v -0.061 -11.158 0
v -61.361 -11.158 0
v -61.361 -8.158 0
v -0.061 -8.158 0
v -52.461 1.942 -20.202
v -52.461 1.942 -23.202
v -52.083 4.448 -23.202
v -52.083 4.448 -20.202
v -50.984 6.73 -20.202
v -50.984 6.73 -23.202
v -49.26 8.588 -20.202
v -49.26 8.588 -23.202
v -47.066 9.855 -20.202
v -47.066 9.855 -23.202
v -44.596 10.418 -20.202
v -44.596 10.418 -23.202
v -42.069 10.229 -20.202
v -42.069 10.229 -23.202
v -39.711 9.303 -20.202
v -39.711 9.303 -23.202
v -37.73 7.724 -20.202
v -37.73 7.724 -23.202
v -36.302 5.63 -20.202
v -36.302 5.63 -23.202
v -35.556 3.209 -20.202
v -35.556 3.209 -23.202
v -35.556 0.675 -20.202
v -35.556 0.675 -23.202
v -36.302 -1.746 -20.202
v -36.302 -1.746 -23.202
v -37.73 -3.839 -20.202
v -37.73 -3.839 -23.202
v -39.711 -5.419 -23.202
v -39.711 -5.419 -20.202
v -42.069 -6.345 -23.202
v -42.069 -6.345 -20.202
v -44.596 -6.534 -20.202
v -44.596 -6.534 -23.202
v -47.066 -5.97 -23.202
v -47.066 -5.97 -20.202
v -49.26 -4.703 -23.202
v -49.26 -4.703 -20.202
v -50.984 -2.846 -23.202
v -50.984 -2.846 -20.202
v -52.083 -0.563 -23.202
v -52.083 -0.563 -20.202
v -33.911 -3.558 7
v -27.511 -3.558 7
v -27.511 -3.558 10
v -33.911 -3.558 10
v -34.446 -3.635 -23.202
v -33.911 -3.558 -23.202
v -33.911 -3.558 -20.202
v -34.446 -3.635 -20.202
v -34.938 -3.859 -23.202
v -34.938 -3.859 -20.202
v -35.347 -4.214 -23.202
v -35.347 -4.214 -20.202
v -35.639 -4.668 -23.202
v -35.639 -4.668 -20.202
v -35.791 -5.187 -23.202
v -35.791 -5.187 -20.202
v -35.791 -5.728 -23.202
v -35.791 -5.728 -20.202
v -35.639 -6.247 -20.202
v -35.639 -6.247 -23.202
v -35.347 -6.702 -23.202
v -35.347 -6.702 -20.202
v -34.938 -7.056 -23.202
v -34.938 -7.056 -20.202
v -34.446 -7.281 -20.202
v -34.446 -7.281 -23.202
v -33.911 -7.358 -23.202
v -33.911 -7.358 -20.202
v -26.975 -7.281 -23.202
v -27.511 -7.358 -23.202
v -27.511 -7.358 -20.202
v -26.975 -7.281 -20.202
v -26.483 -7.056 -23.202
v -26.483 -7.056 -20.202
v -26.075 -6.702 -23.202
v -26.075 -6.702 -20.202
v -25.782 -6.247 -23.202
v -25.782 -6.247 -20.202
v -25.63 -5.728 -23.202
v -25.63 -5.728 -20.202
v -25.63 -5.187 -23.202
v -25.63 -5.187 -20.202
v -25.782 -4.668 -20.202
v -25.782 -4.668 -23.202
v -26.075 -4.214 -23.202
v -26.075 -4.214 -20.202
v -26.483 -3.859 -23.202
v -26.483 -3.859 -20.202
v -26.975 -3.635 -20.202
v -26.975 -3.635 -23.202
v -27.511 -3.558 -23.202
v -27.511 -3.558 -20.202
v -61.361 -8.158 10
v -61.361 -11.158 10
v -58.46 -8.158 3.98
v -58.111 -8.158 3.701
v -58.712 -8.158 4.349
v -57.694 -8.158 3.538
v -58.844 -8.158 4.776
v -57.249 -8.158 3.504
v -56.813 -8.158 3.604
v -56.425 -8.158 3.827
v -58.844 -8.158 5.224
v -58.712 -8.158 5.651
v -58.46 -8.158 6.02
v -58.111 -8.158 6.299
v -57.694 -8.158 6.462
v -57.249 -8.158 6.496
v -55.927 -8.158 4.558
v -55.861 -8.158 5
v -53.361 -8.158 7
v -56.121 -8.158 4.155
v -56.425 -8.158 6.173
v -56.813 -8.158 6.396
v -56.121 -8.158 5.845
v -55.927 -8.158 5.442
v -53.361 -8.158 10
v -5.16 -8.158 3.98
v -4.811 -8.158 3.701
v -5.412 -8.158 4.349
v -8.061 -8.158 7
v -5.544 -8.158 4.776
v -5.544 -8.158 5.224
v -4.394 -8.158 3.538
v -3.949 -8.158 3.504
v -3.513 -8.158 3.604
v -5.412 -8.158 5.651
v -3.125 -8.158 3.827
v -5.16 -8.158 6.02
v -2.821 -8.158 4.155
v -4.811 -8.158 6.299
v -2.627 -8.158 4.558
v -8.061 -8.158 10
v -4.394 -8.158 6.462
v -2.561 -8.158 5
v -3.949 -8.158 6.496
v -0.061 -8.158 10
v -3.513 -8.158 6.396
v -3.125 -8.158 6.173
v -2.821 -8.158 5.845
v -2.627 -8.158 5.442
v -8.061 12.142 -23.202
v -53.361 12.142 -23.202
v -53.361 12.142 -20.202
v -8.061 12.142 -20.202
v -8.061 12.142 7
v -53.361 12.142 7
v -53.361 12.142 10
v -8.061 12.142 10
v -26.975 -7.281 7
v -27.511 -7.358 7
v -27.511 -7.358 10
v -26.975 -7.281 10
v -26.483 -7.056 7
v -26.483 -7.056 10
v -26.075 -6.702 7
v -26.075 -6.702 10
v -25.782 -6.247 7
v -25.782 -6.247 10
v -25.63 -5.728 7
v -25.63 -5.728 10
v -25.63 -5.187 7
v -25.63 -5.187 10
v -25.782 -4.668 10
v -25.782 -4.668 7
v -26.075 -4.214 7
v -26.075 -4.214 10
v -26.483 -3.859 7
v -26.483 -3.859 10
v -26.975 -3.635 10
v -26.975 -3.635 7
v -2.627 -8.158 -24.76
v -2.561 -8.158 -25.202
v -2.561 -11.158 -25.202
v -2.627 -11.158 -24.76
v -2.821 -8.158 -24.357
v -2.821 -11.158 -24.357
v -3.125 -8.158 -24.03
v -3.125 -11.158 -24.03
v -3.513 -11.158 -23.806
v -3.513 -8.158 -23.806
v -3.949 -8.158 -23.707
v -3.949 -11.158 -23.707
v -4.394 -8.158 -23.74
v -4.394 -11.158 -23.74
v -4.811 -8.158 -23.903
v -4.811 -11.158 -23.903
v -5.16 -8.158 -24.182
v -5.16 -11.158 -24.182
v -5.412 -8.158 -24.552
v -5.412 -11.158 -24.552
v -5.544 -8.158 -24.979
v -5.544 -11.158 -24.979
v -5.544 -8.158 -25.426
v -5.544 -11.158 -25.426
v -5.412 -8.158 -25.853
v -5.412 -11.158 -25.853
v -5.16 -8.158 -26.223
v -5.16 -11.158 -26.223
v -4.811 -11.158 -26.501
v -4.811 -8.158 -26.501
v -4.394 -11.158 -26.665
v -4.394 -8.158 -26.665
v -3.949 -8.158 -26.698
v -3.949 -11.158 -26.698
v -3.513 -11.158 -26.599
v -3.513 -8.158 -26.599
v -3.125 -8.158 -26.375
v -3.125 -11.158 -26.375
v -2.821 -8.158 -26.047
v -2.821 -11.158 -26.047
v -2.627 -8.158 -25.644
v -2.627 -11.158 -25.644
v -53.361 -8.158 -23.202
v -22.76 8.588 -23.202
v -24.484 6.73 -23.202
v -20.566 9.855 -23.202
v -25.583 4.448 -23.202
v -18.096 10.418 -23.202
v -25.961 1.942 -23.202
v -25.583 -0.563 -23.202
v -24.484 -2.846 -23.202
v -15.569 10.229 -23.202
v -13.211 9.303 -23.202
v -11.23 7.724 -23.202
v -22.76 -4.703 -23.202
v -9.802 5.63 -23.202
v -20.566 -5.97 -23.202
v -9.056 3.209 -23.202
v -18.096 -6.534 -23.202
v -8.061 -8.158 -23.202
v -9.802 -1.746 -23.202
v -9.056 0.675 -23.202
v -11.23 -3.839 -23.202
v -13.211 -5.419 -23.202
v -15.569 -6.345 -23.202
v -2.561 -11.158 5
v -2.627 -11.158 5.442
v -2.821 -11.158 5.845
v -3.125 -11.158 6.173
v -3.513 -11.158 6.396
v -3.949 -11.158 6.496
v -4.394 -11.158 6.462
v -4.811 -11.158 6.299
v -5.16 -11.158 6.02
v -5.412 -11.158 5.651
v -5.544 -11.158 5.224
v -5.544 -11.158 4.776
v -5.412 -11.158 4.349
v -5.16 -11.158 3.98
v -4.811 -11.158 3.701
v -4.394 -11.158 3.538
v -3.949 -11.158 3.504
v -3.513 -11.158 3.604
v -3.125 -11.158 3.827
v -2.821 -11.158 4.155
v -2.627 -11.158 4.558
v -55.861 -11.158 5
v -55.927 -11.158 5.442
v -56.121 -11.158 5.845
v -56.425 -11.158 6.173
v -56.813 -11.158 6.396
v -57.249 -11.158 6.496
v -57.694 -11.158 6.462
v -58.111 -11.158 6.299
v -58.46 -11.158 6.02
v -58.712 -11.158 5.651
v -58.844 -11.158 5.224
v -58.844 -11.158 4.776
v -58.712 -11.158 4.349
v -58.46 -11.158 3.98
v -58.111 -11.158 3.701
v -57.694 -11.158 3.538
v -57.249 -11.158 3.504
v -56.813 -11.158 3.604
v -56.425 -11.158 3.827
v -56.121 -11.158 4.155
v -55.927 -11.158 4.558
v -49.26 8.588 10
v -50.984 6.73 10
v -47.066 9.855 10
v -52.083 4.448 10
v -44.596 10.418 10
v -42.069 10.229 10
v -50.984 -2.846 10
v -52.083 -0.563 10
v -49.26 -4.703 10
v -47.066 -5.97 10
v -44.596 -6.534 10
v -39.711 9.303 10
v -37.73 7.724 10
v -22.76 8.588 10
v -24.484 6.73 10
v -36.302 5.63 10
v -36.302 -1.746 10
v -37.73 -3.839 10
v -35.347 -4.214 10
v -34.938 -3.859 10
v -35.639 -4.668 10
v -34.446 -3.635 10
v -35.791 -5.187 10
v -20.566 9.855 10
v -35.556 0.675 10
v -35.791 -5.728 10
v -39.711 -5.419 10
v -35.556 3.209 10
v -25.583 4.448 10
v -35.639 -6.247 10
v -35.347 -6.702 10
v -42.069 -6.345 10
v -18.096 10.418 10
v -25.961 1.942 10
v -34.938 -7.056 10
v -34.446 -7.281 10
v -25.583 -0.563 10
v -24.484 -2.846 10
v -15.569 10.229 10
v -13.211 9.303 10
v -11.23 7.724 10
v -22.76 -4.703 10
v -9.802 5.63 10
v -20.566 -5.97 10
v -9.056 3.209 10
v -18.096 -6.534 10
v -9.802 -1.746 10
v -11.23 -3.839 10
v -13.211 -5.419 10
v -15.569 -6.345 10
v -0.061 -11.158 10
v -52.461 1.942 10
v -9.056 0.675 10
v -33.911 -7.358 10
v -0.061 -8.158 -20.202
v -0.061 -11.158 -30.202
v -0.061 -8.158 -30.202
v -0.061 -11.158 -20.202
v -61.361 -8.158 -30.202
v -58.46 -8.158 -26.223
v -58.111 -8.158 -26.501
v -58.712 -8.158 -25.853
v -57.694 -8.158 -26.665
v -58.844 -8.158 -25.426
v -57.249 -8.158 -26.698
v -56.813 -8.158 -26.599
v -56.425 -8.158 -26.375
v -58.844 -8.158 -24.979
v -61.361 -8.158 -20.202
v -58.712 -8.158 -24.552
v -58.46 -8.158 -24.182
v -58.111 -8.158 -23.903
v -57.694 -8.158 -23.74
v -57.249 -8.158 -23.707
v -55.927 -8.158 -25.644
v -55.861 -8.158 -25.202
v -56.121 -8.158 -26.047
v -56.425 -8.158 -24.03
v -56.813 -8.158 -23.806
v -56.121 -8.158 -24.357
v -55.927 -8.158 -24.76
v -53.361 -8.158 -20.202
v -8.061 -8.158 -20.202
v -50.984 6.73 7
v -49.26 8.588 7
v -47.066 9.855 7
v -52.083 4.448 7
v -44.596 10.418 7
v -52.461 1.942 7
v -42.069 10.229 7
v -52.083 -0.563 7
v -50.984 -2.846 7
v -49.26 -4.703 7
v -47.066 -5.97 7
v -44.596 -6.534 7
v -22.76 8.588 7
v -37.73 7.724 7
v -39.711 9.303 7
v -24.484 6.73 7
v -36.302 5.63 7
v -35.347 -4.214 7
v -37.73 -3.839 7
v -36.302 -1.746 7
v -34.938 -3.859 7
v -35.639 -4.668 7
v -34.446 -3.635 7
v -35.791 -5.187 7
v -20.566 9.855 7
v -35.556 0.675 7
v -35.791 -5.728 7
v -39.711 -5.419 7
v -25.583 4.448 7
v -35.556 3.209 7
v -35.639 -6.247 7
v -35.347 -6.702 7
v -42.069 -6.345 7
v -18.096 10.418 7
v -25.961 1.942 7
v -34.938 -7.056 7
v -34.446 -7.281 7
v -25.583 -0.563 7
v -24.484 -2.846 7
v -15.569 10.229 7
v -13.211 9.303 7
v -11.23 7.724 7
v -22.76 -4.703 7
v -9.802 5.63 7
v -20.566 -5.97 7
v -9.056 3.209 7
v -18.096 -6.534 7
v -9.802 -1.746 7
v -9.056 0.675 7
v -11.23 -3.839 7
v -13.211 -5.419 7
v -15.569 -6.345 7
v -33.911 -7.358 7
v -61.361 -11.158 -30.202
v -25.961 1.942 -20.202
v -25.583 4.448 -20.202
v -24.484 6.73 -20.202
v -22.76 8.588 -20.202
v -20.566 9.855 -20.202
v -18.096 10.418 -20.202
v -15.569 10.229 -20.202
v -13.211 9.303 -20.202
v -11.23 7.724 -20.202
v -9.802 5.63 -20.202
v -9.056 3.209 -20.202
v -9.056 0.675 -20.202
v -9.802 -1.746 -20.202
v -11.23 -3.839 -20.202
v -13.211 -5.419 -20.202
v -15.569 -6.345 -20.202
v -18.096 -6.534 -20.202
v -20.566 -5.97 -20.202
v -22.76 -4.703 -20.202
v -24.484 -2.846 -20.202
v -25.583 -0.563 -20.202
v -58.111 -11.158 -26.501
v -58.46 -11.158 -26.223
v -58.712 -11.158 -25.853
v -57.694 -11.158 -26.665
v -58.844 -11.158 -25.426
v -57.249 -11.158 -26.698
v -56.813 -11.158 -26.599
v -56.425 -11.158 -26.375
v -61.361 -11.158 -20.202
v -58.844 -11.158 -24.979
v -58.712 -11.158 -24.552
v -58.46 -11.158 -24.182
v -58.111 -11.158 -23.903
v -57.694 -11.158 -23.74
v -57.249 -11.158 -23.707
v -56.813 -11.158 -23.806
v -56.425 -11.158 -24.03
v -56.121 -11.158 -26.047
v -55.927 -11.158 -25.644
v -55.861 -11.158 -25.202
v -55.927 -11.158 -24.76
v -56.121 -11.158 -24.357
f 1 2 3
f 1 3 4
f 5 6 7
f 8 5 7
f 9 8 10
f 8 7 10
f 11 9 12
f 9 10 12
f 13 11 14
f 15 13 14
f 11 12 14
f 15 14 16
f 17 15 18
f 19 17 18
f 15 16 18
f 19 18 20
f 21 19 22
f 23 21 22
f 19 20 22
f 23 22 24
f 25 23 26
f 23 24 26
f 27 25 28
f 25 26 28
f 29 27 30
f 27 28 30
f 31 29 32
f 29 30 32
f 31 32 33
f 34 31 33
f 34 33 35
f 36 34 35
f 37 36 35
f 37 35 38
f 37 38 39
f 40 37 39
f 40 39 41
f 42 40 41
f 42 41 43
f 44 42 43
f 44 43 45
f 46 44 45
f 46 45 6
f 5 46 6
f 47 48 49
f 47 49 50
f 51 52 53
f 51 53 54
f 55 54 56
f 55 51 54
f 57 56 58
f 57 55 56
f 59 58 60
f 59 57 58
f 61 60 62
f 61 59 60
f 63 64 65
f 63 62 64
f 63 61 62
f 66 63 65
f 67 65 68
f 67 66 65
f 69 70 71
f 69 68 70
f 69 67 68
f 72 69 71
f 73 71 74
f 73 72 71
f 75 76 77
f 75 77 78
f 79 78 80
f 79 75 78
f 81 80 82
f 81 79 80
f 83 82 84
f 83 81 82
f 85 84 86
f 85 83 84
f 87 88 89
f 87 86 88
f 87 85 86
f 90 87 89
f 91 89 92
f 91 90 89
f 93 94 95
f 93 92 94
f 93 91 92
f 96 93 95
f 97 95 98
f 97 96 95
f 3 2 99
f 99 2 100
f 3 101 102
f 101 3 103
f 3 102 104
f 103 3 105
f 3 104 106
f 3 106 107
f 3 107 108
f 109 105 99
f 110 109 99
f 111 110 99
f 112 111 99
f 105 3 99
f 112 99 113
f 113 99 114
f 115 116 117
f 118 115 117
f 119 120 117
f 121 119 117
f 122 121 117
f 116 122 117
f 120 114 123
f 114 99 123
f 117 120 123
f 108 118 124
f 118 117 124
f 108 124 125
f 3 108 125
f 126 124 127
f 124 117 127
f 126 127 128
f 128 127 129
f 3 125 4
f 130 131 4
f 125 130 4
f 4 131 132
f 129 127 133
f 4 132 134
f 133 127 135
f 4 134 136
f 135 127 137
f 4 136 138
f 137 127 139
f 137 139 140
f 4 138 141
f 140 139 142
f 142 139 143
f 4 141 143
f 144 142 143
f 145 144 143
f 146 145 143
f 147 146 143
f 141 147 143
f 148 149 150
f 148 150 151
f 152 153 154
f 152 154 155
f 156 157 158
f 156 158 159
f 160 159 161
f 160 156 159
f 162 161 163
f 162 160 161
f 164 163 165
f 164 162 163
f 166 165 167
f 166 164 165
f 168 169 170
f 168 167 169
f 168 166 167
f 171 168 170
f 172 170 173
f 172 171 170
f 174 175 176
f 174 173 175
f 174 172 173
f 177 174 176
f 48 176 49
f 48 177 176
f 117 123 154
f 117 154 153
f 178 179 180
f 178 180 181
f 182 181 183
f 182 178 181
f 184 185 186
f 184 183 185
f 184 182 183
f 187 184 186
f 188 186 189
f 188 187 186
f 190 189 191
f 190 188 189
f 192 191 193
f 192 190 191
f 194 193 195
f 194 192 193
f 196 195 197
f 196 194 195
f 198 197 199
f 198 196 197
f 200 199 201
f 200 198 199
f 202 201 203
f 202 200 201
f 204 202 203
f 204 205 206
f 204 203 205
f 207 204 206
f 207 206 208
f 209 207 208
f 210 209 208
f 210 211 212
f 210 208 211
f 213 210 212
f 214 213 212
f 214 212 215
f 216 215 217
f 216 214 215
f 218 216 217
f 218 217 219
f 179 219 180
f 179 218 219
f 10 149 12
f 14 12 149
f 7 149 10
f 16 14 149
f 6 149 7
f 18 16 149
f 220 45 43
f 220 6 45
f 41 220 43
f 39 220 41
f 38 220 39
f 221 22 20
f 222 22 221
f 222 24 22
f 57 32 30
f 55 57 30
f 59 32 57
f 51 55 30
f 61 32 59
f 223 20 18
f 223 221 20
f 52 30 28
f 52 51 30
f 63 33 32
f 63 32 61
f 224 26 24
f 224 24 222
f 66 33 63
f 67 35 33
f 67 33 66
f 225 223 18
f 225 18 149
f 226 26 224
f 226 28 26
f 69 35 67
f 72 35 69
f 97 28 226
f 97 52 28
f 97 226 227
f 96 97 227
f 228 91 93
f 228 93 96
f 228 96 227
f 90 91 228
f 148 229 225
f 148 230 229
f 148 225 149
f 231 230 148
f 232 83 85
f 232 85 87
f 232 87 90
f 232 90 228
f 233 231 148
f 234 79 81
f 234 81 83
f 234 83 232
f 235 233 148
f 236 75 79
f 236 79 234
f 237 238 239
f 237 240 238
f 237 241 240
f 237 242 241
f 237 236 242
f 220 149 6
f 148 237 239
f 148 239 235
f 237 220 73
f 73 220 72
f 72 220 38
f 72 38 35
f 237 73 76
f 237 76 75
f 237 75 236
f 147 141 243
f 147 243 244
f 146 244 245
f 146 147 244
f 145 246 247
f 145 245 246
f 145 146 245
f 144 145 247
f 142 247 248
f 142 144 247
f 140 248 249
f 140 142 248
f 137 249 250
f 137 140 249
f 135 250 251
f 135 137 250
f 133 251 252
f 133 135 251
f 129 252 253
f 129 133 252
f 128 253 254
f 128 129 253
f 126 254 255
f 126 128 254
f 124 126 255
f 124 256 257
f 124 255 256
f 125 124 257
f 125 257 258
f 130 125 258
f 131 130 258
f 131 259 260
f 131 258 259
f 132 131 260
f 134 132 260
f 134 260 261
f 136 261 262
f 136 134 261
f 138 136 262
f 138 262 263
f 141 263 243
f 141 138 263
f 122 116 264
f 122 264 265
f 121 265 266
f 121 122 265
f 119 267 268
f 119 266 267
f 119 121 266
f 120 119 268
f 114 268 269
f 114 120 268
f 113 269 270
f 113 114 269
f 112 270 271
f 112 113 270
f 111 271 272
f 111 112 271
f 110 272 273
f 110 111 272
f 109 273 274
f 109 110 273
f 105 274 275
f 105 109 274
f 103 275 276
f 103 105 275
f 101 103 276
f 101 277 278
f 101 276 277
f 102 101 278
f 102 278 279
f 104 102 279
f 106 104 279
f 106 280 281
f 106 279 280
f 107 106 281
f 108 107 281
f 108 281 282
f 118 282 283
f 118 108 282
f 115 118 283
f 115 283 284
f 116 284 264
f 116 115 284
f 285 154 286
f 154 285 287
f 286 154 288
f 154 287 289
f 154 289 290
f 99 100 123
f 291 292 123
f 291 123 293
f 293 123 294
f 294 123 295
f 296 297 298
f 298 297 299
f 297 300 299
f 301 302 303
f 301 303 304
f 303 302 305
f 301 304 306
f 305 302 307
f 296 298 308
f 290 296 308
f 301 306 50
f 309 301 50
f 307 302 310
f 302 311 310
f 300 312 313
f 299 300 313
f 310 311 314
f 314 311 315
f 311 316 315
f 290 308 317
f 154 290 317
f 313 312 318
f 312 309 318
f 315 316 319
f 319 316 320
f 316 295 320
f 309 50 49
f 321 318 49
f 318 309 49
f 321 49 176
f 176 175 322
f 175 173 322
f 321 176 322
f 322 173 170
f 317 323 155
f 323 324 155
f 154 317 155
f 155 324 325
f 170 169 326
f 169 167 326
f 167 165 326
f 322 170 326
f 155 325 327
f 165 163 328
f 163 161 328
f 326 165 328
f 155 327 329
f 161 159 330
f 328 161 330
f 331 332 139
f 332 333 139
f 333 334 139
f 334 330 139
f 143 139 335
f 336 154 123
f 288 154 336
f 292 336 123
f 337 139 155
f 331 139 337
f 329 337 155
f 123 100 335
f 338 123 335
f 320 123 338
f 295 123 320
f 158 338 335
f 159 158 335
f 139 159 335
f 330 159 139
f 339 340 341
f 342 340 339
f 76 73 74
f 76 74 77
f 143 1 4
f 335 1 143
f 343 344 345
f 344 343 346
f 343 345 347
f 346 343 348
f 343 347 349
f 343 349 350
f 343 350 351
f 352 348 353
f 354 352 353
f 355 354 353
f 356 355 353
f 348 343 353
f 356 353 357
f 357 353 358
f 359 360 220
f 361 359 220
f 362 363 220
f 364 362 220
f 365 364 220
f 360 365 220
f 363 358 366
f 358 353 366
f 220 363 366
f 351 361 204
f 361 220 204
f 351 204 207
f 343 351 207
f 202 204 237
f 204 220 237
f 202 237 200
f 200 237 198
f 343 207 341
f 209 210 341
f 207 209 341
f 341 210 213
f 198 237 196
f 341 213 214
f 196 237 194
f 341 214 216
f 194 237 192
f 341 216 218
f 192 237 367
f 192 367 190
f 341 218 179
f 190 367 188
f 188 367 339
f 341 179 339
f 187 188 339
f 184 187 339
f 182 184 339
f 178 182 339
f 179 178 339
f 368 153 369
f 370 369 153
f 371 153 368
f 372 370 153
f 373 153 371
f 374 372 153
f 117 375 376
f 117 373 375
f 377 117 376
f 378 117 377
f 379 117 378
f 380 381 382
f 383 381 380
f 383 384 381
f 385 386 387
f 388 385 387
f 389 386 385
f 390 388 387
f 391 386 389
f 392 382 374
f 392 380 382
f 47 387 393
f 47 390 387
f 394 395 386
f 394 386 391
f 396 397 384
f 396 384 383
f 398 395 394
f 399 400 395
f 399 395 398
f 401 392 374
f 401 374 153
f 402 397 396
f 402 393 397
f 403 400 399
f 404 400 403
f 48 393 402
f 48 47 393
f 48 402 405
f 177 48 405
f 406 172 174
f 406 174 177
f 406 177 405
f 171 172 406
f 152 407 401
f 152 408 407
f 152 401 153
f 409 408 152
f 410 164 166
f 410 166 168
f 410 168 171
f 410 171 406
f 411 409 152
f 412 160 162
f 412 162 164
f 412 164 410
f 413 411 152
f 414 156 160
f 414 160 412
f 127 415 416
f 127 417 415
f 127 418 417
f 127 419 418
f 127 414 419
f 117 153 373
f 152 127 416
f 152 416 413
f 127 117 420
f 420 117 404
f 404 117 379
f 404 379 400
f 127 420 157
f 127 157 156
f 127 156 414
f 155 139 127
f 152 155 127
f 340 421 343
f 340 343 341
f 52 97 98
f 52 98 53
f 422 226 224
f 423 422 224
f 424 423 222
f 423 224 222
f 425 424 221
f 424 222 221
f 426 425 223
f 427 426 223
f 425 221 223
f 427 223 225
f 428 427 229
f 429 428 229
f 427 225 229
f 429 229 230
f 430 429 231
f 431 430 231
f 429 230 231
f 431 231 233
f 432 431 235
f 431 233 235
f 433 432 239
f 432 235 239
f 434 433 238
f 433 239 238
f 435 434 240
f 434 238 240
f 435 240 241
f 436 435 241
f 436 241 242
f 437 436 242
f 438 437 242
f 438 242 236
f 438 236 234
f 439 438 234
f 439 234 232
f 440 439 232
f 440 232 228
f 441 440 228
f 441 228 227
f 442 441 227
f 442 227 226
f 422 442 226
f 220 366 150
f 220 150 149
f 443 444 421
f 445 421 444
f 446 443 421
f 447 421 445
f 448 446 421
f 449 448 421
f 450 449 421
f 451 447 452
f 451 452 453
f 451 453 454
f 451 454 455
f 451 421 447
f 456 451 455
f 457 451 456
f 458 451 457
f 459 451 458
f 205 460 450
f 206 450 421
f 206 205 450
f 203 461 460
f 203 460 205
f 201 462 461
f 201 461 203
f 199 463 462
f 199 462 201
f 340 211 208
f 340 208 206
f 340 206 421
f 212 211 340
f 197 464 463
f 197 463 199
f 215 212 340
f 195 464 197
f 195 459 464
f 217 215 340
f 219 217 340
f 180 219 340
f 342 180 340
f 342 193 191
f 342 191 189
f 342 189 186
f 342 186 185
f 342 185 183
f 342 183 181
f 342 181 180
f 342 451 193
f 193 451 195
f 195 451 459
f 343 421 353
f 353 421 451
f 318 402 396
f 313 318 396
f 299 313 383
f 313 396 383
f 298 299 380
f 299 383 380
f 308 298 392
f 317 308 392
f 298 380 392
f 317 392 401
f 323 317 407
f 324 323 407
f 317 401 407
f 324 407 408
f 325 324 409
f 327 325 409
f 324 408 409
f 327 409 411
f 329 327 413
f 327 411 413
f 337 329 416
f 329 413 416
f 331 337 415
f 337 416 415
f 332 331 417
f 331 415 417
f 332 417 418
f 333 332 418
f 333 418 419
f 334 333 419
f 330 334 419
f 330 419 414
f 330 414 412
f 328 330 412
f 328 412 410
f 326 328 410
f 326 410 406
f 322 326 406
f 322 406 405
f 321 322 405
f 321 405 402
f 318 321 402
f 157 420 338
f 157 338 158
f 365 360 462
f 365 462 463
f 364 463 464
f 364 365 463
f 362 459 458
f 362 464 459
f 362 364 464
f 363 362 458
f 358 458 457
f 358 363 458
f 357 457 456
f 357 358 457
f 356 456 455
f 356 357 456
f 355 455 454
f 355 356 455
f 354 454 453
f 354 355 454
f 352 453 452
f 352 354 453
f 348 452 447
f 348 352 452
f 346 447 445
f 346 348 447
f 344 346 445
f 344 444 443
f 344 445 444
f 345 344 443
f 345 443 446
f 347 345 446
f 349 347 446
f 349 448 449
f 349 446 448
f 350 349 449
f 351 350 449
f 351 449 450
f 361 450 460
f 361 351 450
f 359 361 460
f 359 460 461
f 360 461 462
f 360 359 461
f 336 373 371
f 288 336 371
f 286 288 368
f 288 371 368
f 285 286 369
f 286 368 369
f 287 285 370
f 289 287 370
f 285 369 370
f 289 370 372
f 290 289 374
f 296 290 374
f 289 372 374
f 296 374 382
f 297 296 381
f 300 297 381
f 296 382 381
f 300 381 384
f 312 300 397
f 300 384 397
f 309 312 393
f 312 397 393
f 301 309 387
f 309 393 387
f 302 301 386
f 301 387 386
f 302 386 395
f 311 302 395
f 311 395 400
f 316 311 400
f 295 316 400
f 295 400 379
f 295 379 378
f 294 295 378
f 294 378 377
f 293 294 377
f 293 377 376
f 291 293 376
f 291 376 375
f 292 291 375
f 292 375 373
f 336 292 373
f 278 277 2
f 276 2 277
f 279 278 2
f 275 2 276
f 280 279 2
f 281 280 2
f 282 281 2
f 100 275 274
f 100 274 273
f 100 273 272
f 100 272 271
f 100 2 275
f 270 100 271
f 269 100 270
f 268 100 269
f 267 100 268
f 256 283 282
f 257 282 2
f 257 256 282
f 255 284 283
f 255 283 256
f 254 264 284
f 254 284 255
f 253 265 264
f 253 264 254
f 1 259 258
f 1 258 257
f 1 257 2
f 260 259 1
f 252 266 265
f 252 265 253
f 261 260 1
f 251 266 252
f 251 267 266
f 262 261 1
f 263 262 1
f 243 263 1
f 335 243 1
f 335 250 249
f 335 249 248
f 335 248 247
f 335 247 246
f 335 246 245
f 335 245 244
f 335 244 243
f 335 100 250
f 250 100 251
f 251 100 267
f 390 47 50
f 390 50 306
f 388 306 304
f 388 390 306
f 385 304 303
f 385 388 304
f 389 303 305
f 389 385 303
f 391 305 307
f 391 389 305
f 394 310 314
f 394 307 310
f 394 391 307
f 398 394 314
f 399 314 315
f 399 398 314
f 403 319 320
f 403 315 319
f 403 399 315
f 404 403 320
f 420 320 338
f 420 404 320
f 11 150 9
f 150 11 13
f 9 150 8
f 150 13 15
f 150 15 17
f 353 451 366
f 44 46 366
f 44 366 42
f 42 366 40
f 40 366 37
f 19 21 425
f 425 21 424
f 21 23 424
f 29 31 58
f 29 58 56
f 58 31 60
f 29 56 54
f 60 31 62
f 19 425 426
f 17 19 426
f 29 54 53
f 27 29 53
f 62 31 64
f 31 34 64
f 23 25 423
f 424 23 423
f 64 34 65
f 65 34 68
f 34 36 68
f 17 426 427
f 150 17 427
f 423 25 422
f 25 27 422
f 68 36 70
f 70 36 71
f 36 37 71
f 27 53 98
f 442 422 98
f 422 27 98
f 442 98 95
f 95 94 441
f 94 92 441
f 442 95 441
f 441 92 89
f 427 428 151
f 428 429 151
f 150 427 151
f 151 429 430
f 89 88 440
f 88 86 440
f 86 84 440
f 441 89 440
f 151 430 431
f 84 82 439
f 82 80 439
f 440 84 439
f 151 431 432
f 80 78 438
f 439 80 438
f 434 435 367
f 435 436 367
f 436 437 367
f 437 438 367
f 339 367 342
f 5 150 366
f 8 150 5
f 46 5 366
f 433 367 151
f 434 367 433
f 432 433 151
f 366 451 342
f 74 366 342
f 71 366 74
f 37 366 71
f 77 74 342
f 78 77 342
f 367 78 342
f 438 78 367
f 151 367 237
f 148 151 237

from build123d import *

# Parameters (mm, degrees)
SKETCH1_W               = 170
SKETCH1_H               = 3
BOSS_EXTRUDE1_DEPTH     = 10
SKETCH4_R               = 1.2
CUT_EXTRUDE1_DEPTH      = 21
SKETCH2_W               = 45.3
SKETCH2_H               = 3
BOSS_EXTRUDE6_DEPTH     = 20.3
SKETCH5_R               = 8.5
CUT_EXTRUDE2_DEPTH      = 20.3
SKETCH6_W               = 45.3
SKETCH6_H               = 3
BOSS_EXTRUDE7_DEPTH     = 20.3
SKETCH7_R               = 8.5
CUT_EXTRUDE3_DEPTH      = 100.885733504
CUT_EXTRUDE5_DEPTH      = 102.201856693
CUT_EXTRUDE5_DEPTH_BACK = 102.201856693
SKETCH12_W              = 88.7
SKETCH12_H              = 17.241657791
CUT_EXTRUDE6_DEPTH      = 75.862735481
CUT_EXTRUDE6_DEPTH_BACK = 75.862735481
SKETCH13_W              = 37.135878318
SKETCH13_H              = 38.462159687
SKETCH13_W_2            = 38.462159687
SKETCH13_H_2            = 47.746129266
SKETCH15_W              = 8
SKETCH15_H              = 10
BOSS_EXTRUDE9_DEPTH     = 3
CUT_EXTRUDE7_DEPTH      = 67.392895801
CUT_EXTRUDE7_DEPTH_BACK = 67.392895801
SKETCH16_R              = 1.5


with BuildPart() as part:
    # Sketch1 → Boss-Extrude1 (new body)
    with BuildSketch(Plane.XY):
        with Locations((13.639372454, -9.657761352)):
            Rectangle(SKETCH1_W, SKETCH1_H)
    extrude(amount=BOSS_EXTRUDE1_DEPTH)

    # Sketch4 → Cut-Extrude1 (cut)
    with BuildSketch(Plane(origin=(0, -8.157761352, 0), x_dir=(1, 0, 0), z_dir=(0, 1, 0))):
        with Locations(Location((-63.360627546, -4.938536908, 0), (0, 0, 180))):
            Circle(SKETCH4_R)
        with Locations(Location((90.639372454, -5.283238547, 0), (0, 0, 180))):
            Circle(SKETCH4_R)
    extrude(amount=-CUT_EXTRUDE1_DEPTH, mode=Mode.SUBTRACT)

    # Sketch2 → Boss-Extrude6 (add)
    with BuildSketch(Plane(origin=(0, -8.157761352, 0), x_dir=(1, 0, 0), z_dir=(0, 1, 0))):
        with Locations((-30.710627546, -8.5)):
            Rectangle(SKETCH2_W, SKETCH2_H)
    extrude(amount=BOSS_EXTRUDE6_DEPTH)

    # Sketch5 → Cut-Extrude2 (cut)
    with BuildSketch(Plane(origin=(0, 0, 7), x_dir=(-1, 0, 0), z_dir=(0, 0, -1))):
        with Locations((17.460627546, 1.942238648)):
            Circle(SKETCH5_R)
        with Locations((43.960627546, 1.942238648)):
            Circle(SKETCH5_R)
        with BuildLine():
            Line((27.510627546, -3.557761352), (33.910627546, -3.557761352))
            ThreePointArc((33.910627546, -3.557761352), (35.810627546, -5.457761352), (33.910627546, -7.357761352))
            Line((33.910627546, -7.357761352), (27.510627546, -7.357761352))
            ThreePointArc((27.510627546, -7.357761352), (25.610627546, -5.457761352), (27.510627546, -3.557761352))
        make_face()
    extrude(amount=-CUT_EXTRUDE2_DEPTH, mode=Mode.SUBTRACT)

    # Sketch6 → Boss-Extrude7 (add)
    with BuildSketch(Plane(origin=(0, -8.157761352, 0), x_dir=(1, 0, 0), z_dir=(0, 1, 0))):
        with Locations((57.989372454, -8.5)):
            Rectangle(SKETCH6_W, SKETCH6_H)
    extrude(amount=BOSS_EXTRUDE7_DEPTH)

    # Sketch7 → Cut-Extrude3 (cut, through all)
    with BuildSketch(Plane.XY.offset(10)):
        with Locations((44.739372454, 1.942238648)):
            Circle(SKETCH7_R)
        with Locations((71.239372454, 1.942238648)):
            Circle(SKETCH7_R)
        with BuildLine():
            Line((54.839372454, -3.557761352), (61.239372454, -3.557761352))
            ThreePointArc((61.239372454, -3.557761352), (63.139372454, -5.457761352), (61.239372454, -7.357761352))
            Line((61.239372454, -7.357761352), (54.839372454, -7.357761352))
            ThreePointArc((54.839372454, -7.357761352), (52.939372454, -5.457761352), (54.839372454, -3.557761352))
        make_face()
    extrude(amount=-CUT_EXTRUDE3_DEPTH, mode=Mode.SUBTRACT)

    # Sketch12 → Cut-Extrude5 (cut, two sides: drawn at the far end of the back side and taken through both)
    with BuildSketch(Plane(origin=(0, -8.157761352, 0), x_dir=(1, 0, 0), z_dir=(0, 1, 0)).offset(-CUT_EXTRUDE5_DEPTH_BACK)):
        with Locations((54.289372454, -4.61843826)):
            Rectangle(SKETCH12_W, SKETCH12_H)
    extrude(amount=CUT_EXTRUDE5_DEPTH + CUT_EXTRUDE5_DEPTH_BACK, mode=Mode.SUBTRACT)

    # Sketch13 → Cut-Extrude6 (cut, two sides: drawn at the far end of the back side and taken through both)
    with BuildSketch(Plane(origin=(0, -8.157761352, 0), x_dir=(1, 0, 0), z_dir=(0, 1, 0)).offset(-CUT_EXTRUDE6_DEPTH_BACK)):
        with Locations((-71.928566705, 3.983905185)):
            Rectangle(SKETCH13_W, SKETCH13_H)
        with Locations((11.170452297, -17.070811541)):
            Rectangle(SKETCH13_W_2, SKETCH13_H_2)
    extrude(amount=CUT_EXTRUDE6_DEPTH + CUT_EXTRUDE6_DEPTH_BACK, mode=Mode.SUBTRACT)

    # Sketch15 → Boss-Extrude9 (add)
    with BuildSketch(Plane.XZ.offset(11.157761352)):
        with Locations((-57.360627546, 5)):
            Rectangle(SKETCH15_W, SKETCH15_H)
        with Locations((-4.060627546, 5)):
            Rectangle(SKETCH15_W, SKETCH15_H)
    extrude(amount=-BOSS_EXTRUDE9_DEPTH)

    # Sketch16 → Cut-Extrude7 (cut, two sides: drawn at the far end of the back side and taken through both)
    with BuildSketch(Plane(origin=(0, -11.157761352, 0), x_dir=(-1, 0, 0), z_dir=(0, -1, 0)).offset(-CUT_EXTRUDE7_DEPTH_BACK)):
        with Locations(Location((57.360627546, -5, 0), (0, 0, 180))):
            Circle(SKETCH16_R)
        with Locations(Location((4.060627546, -5, 0), (0, 0, 180))):
            Circle(SKETCH16_R)
    extrude(amount=CUT_EXTRUDE7_DEPTH + CUT_EXTRUDE7_DEPTH_BACK, mode=Mode.SUBTRACT)


with BuildPart() as body_2:
    # Body-Move/Copy1: copy of part
    add(part.part.moved(Location((0, 0, -30.202366557))))


solid = Compound([part.part, body_2.part])
